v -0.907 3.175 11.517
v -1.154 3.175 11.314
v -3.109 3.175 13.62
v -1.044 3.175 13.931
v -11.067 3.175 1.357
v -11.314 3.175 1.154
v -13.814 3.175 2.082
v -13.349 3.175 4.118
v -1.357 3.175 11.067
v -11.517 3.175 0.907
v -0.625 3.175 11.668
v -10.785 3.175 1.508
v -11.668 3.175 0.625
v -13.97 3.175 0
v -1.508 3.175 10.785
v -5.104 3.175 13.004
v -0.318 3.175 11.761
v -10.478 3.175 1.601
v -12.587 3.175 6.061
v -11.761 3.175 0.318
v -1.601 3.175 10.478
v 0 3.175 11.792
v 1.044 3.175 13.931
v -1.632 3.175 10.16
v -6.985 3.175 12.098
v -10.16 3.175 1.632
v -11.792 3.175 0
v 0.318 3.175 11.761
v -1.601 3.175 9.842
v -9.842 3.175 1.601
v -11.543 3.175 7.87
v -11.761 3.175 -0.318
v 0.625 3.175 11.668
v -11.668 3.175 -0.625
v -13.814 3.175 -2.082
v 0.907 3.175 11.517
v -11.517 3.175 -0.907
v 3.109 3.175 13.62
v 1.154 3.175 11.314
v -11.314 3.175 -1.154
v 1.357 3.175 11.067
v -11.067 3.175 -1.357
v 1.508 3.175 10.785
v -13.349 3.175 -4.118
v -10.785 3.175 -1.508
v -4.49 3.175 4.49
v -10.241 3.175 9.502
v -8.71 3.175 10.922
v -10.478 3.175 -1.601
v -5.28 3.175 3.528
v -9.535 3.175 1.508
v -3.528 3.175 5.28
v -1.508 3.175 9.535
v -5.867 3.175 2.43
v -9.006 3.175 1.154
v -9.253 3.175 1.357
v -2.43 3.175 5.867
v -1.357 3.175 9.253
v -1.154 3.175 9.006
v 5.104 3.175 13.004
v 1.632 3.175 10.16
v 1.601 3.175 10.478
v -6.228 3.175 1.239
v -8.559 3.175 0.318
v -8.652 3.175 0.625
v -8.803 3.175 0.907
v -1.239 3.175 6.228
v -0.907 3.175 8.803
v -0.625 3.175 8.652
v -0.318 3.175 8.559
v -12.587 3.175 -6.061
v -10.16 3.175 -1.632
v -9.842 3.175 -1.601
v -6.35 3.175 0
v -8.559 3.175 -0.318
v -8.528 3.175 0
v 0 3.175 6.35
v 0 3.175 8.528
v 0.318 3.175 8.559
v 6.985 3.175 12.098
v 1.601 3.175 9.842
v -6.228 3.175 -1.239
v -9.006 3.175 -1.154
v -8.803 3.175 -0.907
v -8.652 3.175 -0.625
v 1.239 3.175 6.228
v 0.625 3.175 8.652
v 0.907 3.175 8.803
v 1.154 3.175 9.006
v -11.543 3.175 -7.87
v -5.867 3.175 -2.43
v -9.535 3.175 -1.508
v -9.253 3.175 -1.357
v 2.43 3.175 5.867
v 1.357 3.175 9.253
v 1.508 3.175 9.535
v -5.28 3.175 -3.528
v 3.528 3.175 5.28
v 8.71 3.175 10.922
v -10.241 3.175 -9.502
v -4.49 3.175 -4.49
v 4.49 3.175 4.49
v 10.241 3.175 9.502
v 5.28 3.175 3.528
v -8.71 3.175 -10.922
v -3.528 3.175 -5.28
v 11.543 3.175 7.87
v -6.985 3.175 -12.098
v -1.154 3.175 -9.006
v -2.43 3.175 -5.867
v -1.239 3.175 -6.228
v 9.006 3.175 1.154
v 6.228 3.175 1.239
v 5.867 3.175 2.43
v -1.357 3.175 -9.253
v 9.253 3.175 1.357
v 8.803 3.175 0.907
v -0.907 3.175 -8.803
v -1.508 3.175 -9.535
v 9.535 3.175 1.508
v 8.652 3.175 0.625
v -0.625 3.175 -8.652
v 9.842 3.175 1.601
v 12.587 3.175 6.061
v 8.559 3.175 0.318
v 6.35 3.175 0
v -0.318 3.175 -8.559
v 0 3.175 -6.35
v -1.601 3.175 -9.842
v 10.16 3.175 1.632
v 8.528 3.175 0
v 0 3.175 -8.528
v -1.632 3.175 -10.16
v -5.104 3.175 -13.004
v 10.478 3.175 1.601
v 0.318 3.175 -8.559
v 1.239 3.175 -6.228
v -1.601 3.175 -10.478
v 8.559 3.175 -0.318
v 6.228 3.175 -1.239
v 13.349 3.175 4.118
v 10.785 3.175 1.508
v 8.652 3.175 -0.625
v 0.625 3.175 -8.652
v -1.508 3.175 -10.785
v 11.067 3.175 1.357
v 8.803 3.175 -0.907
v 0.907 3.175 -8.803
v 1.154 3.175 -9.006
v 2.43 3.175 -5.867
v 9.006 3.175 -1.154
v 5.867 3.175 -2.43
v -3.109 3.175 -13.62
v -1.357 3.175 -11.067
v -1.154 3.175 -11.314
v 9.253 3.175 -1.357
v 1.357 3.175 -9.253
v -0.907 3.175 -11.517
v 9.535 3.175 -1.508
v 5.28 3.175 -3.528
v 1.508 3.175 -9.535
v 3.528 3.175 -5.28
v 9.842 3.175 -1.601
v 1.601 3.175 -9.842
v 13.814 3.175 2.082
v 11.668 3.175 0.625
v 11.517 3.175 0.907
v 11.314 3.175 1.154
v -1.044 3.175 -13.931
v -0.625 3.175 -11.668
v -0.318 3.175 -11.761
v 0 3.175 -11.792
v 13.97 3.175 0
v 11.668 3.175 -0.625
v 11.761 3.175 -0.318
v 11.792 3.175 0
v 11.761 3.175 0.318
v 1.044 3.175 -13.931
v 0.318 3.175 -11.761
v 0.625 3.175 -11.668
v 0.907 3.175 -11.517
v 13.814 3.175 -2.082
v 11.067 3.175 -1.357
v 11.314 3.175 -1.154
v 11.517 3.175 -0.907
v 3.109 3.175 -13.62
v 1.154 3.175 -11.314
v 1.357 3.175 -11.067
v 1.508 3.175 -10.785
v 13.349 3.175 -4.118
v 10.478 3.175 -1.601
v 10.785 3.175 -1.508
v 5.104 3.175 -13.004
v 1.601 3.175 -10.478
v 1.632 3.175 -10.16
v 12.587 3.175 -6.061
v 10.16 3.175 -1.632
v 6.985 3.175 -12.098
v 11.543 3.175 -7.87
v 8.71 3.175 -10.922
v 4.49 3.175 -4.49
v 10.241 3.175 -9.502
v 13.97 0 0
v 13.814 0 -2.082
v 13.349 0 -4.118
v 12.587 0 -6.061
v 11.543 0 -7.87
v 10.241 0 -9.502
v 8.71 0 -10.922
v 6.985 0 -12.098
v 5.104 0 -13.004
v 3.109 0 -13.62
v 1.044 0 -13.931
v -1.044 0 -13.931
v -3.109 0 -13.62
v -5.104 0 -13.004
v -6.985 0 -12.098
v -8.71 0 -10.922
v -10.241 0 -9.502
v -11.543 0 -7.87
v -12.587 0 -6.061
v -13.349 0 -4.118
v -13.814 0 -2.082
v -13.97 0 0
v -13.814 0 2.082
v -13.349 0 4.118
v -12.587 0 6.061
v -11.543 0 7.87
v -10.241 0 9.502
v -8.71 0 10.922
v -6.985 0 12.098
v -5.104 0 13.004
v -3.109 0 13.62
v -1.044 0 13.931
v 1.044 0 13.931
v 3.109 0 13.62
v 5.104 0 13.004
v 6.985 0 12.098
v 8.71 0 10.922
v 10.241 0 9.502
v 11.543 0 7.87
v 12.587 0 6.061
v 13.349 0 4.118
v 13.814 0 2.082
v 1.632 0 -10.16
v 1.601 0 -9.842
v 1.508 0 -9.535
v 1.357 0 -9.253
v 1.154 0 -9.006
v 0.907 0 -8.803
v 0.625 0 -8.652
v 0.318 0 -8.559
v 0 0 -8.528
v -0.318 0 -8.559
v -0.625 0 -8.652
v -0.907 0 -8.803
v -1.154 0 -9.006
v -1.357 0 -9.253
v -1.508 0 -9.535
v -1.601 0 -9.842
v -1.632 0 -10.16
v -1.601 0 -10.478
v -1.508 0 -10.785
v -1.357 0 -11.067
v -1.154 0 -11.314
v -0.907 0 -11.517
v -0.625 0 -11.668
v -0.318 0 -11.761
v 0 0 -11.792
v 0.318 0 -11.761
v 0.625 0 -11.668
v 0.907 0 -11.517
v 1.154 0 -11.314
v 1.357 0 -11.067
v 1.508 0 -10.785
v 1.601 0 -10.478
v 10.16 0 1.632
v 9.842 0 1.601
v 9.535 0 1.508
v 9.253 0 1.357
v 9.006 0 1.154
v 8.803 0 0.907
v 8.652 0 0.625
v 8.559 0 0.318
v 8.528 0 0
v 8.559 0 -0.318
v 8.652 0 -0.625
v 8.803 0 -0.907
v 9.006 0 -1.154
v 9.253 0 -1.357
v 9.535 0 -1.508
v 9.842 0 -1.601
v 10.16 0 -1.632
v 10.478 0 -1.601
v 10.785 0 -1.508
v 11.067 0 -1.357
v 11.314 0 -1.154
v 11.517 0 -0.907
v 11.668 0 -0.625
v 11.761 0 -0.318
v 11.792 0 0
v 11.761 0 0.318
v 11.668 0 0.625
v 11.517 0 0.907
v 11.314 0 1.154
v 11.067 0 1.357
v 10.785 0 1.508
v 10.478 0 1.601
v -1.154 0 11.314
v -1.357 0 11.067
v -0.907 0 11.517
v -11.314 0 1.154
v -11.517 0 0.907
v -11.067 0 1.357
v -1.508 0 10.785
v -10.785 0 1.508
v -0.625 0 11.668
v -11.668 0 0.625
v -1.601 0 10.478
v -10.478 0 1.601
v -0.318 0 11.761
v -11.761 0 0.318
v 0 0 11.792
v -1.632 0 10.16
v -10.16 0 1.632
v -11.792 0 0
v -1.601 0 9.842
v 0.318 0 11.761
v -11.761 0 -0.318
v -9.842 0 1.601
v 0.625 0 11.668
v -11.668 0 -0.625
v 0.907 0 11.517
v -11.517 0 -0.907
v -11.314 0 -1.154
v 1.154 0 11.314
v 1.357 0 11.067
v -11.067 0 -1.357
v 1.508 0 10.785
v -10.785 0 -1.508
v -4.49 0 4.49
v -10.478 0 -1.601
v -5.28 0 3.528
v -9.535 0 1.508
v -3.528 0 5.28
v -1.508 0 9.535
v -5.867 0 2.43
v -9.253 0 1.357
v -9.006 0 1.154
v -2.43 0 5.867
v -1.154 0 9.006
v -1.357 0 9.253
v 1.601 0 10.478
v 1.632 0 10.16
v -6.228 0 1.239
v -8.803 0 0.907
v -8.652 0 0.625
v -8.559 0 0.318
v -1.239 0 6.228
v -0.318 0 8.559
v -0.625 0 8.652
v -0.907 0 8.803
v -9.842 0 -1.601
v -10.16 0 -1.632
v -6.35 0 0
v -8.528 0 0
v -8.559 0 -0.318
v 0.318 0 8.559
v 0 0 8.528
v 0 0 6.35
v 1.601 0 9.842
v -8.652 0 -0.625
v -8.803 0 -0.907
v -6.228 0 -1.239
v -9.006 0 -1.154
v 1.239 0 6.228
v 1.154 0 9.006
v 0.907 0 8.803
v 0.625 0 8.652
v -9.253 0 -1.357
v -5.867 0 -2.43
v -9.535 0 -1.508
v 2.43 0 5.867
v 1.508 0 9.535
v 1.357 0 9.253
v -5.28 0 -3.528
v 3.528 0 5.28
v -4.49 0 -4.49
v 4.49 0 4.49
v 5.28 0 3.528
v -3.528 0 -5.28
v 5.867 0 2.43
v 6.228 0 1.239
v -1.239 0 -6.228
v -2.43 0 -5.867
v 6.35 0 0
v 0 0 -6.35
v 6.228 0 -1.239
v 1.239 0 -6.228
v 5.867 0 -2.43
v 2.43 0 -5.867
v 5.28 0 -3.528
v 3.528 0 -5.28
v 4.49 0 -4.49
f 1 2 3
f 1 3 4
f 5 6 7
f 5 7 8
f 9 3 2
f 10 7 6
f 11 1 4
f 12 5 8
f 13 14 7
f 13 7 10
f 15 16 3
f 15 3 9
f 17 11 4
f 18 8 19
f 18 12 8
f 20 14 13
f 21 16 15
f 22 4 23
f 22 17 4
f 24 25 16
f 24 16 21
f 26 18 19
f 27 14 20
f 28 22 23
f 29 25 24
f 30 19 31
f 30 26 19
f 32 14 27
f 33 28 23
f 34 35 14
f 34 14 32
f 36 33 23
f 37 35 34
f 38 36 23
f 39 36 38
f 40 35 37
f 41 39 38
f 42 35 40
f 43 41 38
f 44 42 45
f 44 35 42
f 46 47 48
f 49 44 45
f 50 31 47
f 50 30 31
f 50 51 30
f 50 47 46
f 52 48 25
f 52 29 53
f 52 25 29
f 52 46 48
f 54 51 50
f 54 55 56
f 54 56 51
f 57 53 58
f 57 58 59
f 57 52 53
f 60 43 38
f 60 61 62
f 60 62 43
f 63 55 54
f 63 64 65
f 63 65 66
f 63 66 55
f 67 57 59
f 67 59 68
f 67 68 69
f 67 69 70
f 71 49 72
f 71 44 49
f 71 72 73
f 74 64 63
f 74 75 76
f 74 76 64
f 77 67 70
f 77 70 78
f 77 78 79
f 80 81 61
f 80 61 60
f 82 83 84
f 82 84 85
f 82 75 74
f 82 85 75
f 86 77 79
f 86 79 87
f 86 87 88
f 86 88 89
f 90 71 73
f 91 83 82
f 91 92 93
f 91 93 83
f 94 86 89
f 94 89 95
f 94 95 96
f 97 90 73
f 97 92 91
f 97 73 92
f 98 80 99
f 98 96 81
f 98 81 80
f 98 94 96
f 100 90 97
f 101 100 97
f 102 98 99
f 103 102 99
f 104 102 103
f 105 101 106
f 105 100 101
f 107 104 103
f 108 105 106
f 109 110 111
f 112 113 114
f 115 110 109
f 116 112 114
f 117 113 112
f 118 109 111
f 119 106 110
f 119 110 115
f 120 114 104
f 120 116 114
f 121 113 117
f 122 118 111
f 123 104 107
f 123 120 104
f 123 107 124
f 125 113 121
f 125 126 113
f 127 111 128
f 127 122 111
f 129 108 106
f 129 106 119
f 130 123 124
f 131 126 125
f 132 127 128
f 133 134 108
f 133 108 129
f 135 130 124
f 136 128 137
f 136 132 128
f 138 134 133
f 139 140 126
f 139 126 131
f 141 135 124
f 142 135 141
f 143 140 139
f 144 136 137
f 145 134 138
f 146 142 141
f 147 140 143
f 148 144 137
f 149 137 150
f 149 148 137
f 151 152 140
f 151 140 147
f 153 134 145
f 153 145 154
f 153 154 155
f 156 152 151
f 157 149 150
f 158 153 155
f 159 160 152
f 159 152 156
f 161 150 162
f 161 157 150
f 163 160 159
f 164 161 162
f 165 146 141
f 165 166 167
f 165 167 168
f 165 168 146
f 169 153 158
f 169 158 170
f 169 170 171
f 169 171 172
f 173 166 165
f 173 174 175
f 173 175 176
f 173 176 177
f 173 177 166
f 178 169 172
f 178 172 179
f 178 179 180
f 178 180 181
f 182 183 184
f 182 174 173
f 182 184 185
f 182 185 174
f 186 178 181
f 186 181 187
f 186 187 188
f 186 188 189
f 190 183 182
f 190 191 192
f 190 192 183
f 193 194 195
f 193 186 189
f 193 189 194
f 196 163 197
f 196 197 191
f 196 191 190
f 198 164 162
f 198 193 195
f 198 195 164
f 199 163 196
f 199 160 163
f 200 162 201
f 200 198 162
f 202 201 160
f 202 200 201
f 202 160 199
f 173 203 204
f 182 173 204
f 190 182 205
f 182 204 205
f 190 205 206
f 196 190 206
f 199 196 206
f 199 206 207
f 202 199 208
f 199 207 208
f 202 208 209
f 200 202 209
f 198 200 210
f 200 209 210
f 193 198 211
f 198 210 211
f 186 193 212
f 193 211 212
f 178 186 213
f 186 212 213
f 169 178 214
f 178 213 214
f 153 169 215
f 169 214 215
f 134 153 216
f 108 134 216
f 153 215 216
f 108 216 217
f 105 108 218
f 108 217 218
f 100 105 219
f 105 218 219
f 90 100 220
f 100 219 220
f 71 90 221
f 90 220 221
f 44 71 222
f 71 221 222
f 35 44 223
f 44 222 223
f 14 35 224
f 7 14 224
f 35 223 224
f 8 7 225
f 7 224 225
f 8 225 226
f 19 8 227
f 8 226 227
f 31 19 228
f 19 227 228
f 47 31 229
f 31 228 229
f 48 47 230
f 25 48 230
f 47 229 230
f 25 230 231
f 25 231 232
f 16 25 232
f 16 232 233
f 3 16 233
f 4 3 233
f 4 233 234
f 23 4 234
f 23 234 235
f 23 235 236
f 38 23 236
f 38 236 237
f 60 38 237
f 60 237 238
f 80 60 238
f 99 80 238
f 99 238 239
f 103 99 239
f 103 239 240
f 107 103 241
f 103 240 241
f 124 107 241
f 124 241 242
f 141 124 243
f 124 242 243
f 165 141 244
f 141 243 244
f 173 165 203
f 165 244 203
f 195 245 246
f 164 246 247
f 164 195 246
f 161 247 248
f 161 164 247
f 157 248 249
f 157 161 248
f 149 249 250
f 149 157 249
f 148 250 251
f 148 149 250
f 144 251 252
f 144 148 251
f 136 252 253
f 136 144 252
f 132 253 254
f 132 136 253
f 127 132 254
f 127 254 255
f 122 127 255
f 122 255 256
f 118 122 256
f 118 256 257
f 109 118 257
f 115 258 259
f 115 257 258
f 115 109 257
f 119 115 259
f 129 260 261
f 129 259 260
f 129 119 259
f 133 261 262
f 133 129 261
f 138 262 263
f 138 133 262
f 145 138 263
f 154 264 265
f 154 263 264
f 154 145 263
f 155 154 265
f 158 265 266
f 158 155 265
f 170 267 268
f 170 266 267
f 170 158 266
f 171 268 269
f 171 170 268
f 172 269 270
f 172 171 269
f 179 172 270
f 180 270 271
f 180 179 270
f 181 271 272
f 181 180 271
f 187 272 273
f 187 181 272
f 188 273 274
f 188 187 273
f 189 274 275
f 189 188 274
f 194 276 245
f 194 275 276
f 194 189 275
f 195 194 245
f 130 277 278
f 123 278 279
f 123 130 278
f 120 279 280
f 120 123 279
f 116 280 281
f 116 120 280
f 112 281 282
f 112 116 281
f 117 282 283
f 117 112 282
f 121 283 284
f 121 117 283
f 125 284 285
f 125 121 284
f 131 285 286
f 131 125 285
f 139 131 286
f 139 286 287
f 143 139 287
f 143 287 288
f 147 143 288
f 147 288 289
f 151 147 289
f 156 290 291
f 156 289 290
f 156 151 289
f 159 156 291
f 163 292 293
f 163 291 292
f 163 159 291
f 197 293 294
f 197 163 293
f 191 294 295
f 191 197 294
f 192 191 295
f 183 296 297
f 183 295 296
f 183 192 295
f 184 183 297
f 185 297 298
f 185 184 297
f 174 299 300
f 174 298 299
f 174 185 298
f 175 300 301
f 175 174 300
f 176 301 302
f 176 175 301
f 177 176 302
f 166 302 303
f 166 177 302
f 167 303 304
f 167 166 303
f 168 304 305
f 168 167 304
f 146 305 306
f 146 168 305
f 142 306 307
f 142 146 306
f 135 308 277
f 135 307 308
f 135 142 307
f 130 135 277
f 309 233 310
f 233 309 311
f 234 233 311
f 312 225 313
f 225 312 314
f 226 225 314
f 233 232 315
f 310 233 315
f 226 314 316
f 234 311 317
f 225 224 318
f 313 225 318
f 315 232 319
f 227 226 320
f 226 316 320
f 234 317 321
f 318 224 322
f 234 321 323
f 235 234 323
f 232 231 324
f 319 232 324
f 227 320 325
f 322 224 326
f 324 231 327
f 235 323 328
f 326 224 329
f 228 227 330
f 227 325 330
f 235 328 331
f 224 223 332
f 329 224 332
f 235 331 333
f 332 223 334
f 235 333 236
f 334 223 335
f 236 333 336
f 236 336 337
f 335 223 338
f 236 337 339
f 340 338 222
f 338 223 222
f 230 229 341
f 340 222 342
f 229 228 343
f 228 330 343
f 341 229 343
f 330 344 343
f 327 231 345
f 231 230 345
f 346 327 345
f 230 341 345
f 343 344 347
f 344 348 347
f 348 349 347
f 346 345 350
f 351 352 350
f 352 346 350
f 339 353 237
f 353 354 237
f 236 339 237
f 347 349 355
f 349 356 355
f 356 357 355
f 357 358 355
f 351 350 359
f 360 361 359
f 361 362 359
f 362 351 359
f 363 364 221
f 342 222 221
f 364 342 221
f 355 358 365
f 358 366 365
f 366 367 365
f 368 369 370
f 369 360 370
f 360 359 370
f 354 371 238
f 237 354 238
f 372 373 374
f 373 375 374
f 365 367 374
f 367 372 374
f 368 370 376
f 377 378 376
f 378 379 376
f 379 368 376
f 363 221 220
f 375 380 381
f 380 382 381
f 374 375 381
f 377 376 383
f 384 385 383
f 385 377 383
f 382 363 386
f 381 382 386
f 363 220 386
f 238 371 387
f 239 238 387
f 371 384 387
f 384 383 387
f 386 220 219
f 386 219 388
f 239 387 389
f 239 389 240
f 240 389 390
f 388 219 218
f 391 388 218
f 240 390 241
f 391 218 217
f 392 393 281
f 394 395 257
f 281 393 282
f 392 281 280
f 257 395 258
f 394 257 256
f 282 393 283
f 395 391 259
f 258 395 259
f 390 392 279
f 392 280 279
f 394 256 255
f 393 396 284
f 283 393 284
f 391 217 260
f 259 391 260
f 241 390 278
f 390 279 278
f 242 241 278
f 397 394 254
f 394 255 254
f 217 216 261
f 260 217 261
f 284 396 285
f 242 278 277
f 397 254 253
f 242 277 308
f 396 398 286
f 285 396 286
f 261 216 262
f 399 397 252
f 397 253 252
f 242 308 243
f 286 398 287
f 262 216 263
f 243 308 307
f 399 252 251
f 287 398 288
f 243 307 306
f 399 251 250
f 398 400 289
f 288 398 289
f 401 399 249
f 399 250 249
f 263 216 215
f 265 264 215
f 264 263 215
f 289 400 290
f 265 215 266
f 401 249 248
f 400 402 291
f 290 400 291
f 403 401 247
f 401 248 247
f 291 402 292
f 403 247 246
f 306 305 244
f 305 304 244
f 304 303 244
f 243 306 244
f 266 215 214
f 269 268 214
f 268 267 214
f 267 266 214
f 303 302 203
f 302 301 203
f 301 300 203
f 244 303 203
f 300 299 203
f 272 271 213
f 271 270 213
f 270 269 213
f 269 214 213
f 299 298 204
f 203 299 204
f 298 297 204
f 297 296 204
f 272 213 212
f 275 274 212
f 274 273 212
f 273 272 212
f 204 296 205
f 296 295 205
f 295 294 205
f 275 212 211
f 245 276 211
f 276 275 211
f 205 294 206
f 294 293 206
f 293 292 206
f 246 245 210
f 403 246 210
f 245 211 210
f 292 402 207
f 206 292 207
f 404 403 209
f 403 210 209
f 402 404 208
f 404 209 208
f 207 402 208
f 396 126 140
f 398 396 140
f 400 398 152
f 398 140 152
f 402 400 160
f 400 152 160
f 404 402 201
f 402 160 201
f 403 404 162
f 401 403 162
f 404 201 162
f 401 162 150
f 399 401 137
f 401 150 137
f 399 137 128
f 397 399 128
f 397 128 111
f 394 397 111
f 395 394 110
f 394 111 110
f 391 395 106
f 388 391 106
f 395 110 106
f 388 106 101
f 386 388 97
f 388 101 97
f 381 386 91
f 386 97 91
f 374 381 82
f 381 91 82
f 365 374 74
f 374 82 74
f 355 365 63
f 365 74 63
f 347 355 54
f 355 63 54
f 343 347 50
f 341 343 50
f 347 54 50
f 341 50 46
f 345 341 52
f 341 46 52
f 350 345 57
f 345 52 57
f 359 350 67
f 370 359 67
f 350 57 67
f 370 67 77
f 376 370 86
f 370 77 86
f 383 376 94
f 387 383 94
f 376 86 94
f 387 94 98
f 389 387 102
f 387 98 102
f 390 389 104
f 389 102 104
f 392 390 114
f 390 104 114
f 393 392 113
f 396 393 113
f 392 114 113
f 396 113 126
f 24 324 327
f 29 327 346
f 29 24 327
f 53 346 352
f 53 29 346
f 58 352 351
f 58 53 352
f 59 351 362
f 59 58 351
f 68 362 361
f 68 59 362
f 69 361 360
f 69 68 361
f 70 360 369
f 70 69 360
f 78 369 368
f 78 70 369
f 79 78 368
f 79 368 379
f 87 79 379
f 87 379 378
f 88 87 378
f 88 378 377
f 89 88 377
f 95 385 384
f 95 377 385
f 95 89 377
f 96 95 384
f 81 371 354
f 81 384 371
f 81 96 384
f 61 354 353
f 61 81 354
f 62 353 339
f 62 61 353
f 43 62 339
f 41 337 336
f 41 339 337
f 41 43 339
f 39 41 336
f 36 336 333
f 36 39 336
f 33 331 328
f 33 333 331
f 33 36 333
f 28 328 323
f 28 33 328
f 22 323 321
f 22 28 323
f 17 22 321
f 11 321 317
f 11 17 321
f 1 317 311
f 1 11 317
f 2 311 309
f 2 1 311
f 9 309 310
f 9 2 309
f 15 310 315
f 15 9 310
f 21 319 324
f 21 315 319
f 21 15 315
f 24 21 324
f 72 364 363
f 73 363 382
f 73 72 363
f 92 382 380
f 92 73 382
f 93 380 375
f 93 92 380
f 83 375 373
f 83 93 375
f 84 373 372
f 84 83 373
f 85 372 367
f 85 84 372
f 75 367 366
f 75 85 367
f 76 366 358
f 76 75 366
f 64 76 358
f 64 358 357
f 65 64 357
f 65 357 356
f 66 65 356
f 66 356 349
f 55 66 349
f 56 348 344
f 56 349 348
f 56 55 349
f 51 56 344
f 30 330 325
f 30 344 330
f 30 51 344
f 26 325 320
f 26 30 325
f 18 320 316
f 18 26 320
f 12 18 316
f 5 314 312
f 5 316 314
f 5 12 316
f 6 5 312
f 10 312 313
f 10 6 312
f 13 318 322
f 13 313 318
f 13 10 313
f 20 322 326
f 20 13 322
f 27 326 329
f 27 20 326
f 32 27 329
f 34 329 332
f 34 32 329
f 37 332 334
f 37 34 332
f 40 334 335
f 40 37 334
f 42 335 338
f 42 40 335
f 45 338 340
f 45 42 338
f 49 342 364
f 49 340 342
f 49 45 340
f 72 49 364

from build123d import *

# Parameters (mm, degrees)
SKETCH1_R           = 13.97
BOSS_EXTRUDE1_DEPTH = 3.175
SKETCH5_R           = 6.35
CUT_EXTRUDE2_DEPTH  = 3.175
CIRPATTERN1_COUNT   = 4


with BuildPart() as part:
    # Sketch1 → Boss-Extrude1 (new body)
    with BuildSketch(Plane(origin=(0, 0, 0), x_dir=(1, 0, 0), z_dir=(0, 1, 0))):
        Circle(SKETCH1_R)
    extrude(amount=BOSS_EXTRUDE1_DEPTH)

    # Sketch5 → Cut-Extrude2 (cut)
    with BuildSketch(Plane(origin=(0, 3.175, 0), x_dir=(1, 0, 0), z_dir=(0, 1, 0))):
        Circle(SKETCH5_R)
    extrude(amount=-CUT_EXTRUDE2_DEPTH, mode=Mode.SUBTRACT)

    # Sketch6 → #4 Clearance Hole1 (revolve, cut)
    with BuildSketch(Plane(origin=(10.16, 3.175, 0), x_dir=(0, 0, 1), z_dir=(1, 0, 0))):
        Polygon((0, 0), (0, 11.140574487), (1.63195, 10.16), (1.63195, 0), align=None)
    f_4_clearance_hole1 = revolve(axis=Axis((10.16, 9.525, 0), (0, -1, 0)), mode=Mode.SUBTRACT)

    # CirPattern1: #4 Clearance Hole1 ×4 about axis
    cirpattern1_axis = Axis((0, 0, 0), (0, 1, 0))
    for i in range(1, CIRPATTERN1_COUNT):
        add(f_4_clearance_hole1.rotate(cirpattern1_axis, i * 360 / CIRPATTERN1_COUNT), mode=Mode.SUBTRACT)


solid = part.part
